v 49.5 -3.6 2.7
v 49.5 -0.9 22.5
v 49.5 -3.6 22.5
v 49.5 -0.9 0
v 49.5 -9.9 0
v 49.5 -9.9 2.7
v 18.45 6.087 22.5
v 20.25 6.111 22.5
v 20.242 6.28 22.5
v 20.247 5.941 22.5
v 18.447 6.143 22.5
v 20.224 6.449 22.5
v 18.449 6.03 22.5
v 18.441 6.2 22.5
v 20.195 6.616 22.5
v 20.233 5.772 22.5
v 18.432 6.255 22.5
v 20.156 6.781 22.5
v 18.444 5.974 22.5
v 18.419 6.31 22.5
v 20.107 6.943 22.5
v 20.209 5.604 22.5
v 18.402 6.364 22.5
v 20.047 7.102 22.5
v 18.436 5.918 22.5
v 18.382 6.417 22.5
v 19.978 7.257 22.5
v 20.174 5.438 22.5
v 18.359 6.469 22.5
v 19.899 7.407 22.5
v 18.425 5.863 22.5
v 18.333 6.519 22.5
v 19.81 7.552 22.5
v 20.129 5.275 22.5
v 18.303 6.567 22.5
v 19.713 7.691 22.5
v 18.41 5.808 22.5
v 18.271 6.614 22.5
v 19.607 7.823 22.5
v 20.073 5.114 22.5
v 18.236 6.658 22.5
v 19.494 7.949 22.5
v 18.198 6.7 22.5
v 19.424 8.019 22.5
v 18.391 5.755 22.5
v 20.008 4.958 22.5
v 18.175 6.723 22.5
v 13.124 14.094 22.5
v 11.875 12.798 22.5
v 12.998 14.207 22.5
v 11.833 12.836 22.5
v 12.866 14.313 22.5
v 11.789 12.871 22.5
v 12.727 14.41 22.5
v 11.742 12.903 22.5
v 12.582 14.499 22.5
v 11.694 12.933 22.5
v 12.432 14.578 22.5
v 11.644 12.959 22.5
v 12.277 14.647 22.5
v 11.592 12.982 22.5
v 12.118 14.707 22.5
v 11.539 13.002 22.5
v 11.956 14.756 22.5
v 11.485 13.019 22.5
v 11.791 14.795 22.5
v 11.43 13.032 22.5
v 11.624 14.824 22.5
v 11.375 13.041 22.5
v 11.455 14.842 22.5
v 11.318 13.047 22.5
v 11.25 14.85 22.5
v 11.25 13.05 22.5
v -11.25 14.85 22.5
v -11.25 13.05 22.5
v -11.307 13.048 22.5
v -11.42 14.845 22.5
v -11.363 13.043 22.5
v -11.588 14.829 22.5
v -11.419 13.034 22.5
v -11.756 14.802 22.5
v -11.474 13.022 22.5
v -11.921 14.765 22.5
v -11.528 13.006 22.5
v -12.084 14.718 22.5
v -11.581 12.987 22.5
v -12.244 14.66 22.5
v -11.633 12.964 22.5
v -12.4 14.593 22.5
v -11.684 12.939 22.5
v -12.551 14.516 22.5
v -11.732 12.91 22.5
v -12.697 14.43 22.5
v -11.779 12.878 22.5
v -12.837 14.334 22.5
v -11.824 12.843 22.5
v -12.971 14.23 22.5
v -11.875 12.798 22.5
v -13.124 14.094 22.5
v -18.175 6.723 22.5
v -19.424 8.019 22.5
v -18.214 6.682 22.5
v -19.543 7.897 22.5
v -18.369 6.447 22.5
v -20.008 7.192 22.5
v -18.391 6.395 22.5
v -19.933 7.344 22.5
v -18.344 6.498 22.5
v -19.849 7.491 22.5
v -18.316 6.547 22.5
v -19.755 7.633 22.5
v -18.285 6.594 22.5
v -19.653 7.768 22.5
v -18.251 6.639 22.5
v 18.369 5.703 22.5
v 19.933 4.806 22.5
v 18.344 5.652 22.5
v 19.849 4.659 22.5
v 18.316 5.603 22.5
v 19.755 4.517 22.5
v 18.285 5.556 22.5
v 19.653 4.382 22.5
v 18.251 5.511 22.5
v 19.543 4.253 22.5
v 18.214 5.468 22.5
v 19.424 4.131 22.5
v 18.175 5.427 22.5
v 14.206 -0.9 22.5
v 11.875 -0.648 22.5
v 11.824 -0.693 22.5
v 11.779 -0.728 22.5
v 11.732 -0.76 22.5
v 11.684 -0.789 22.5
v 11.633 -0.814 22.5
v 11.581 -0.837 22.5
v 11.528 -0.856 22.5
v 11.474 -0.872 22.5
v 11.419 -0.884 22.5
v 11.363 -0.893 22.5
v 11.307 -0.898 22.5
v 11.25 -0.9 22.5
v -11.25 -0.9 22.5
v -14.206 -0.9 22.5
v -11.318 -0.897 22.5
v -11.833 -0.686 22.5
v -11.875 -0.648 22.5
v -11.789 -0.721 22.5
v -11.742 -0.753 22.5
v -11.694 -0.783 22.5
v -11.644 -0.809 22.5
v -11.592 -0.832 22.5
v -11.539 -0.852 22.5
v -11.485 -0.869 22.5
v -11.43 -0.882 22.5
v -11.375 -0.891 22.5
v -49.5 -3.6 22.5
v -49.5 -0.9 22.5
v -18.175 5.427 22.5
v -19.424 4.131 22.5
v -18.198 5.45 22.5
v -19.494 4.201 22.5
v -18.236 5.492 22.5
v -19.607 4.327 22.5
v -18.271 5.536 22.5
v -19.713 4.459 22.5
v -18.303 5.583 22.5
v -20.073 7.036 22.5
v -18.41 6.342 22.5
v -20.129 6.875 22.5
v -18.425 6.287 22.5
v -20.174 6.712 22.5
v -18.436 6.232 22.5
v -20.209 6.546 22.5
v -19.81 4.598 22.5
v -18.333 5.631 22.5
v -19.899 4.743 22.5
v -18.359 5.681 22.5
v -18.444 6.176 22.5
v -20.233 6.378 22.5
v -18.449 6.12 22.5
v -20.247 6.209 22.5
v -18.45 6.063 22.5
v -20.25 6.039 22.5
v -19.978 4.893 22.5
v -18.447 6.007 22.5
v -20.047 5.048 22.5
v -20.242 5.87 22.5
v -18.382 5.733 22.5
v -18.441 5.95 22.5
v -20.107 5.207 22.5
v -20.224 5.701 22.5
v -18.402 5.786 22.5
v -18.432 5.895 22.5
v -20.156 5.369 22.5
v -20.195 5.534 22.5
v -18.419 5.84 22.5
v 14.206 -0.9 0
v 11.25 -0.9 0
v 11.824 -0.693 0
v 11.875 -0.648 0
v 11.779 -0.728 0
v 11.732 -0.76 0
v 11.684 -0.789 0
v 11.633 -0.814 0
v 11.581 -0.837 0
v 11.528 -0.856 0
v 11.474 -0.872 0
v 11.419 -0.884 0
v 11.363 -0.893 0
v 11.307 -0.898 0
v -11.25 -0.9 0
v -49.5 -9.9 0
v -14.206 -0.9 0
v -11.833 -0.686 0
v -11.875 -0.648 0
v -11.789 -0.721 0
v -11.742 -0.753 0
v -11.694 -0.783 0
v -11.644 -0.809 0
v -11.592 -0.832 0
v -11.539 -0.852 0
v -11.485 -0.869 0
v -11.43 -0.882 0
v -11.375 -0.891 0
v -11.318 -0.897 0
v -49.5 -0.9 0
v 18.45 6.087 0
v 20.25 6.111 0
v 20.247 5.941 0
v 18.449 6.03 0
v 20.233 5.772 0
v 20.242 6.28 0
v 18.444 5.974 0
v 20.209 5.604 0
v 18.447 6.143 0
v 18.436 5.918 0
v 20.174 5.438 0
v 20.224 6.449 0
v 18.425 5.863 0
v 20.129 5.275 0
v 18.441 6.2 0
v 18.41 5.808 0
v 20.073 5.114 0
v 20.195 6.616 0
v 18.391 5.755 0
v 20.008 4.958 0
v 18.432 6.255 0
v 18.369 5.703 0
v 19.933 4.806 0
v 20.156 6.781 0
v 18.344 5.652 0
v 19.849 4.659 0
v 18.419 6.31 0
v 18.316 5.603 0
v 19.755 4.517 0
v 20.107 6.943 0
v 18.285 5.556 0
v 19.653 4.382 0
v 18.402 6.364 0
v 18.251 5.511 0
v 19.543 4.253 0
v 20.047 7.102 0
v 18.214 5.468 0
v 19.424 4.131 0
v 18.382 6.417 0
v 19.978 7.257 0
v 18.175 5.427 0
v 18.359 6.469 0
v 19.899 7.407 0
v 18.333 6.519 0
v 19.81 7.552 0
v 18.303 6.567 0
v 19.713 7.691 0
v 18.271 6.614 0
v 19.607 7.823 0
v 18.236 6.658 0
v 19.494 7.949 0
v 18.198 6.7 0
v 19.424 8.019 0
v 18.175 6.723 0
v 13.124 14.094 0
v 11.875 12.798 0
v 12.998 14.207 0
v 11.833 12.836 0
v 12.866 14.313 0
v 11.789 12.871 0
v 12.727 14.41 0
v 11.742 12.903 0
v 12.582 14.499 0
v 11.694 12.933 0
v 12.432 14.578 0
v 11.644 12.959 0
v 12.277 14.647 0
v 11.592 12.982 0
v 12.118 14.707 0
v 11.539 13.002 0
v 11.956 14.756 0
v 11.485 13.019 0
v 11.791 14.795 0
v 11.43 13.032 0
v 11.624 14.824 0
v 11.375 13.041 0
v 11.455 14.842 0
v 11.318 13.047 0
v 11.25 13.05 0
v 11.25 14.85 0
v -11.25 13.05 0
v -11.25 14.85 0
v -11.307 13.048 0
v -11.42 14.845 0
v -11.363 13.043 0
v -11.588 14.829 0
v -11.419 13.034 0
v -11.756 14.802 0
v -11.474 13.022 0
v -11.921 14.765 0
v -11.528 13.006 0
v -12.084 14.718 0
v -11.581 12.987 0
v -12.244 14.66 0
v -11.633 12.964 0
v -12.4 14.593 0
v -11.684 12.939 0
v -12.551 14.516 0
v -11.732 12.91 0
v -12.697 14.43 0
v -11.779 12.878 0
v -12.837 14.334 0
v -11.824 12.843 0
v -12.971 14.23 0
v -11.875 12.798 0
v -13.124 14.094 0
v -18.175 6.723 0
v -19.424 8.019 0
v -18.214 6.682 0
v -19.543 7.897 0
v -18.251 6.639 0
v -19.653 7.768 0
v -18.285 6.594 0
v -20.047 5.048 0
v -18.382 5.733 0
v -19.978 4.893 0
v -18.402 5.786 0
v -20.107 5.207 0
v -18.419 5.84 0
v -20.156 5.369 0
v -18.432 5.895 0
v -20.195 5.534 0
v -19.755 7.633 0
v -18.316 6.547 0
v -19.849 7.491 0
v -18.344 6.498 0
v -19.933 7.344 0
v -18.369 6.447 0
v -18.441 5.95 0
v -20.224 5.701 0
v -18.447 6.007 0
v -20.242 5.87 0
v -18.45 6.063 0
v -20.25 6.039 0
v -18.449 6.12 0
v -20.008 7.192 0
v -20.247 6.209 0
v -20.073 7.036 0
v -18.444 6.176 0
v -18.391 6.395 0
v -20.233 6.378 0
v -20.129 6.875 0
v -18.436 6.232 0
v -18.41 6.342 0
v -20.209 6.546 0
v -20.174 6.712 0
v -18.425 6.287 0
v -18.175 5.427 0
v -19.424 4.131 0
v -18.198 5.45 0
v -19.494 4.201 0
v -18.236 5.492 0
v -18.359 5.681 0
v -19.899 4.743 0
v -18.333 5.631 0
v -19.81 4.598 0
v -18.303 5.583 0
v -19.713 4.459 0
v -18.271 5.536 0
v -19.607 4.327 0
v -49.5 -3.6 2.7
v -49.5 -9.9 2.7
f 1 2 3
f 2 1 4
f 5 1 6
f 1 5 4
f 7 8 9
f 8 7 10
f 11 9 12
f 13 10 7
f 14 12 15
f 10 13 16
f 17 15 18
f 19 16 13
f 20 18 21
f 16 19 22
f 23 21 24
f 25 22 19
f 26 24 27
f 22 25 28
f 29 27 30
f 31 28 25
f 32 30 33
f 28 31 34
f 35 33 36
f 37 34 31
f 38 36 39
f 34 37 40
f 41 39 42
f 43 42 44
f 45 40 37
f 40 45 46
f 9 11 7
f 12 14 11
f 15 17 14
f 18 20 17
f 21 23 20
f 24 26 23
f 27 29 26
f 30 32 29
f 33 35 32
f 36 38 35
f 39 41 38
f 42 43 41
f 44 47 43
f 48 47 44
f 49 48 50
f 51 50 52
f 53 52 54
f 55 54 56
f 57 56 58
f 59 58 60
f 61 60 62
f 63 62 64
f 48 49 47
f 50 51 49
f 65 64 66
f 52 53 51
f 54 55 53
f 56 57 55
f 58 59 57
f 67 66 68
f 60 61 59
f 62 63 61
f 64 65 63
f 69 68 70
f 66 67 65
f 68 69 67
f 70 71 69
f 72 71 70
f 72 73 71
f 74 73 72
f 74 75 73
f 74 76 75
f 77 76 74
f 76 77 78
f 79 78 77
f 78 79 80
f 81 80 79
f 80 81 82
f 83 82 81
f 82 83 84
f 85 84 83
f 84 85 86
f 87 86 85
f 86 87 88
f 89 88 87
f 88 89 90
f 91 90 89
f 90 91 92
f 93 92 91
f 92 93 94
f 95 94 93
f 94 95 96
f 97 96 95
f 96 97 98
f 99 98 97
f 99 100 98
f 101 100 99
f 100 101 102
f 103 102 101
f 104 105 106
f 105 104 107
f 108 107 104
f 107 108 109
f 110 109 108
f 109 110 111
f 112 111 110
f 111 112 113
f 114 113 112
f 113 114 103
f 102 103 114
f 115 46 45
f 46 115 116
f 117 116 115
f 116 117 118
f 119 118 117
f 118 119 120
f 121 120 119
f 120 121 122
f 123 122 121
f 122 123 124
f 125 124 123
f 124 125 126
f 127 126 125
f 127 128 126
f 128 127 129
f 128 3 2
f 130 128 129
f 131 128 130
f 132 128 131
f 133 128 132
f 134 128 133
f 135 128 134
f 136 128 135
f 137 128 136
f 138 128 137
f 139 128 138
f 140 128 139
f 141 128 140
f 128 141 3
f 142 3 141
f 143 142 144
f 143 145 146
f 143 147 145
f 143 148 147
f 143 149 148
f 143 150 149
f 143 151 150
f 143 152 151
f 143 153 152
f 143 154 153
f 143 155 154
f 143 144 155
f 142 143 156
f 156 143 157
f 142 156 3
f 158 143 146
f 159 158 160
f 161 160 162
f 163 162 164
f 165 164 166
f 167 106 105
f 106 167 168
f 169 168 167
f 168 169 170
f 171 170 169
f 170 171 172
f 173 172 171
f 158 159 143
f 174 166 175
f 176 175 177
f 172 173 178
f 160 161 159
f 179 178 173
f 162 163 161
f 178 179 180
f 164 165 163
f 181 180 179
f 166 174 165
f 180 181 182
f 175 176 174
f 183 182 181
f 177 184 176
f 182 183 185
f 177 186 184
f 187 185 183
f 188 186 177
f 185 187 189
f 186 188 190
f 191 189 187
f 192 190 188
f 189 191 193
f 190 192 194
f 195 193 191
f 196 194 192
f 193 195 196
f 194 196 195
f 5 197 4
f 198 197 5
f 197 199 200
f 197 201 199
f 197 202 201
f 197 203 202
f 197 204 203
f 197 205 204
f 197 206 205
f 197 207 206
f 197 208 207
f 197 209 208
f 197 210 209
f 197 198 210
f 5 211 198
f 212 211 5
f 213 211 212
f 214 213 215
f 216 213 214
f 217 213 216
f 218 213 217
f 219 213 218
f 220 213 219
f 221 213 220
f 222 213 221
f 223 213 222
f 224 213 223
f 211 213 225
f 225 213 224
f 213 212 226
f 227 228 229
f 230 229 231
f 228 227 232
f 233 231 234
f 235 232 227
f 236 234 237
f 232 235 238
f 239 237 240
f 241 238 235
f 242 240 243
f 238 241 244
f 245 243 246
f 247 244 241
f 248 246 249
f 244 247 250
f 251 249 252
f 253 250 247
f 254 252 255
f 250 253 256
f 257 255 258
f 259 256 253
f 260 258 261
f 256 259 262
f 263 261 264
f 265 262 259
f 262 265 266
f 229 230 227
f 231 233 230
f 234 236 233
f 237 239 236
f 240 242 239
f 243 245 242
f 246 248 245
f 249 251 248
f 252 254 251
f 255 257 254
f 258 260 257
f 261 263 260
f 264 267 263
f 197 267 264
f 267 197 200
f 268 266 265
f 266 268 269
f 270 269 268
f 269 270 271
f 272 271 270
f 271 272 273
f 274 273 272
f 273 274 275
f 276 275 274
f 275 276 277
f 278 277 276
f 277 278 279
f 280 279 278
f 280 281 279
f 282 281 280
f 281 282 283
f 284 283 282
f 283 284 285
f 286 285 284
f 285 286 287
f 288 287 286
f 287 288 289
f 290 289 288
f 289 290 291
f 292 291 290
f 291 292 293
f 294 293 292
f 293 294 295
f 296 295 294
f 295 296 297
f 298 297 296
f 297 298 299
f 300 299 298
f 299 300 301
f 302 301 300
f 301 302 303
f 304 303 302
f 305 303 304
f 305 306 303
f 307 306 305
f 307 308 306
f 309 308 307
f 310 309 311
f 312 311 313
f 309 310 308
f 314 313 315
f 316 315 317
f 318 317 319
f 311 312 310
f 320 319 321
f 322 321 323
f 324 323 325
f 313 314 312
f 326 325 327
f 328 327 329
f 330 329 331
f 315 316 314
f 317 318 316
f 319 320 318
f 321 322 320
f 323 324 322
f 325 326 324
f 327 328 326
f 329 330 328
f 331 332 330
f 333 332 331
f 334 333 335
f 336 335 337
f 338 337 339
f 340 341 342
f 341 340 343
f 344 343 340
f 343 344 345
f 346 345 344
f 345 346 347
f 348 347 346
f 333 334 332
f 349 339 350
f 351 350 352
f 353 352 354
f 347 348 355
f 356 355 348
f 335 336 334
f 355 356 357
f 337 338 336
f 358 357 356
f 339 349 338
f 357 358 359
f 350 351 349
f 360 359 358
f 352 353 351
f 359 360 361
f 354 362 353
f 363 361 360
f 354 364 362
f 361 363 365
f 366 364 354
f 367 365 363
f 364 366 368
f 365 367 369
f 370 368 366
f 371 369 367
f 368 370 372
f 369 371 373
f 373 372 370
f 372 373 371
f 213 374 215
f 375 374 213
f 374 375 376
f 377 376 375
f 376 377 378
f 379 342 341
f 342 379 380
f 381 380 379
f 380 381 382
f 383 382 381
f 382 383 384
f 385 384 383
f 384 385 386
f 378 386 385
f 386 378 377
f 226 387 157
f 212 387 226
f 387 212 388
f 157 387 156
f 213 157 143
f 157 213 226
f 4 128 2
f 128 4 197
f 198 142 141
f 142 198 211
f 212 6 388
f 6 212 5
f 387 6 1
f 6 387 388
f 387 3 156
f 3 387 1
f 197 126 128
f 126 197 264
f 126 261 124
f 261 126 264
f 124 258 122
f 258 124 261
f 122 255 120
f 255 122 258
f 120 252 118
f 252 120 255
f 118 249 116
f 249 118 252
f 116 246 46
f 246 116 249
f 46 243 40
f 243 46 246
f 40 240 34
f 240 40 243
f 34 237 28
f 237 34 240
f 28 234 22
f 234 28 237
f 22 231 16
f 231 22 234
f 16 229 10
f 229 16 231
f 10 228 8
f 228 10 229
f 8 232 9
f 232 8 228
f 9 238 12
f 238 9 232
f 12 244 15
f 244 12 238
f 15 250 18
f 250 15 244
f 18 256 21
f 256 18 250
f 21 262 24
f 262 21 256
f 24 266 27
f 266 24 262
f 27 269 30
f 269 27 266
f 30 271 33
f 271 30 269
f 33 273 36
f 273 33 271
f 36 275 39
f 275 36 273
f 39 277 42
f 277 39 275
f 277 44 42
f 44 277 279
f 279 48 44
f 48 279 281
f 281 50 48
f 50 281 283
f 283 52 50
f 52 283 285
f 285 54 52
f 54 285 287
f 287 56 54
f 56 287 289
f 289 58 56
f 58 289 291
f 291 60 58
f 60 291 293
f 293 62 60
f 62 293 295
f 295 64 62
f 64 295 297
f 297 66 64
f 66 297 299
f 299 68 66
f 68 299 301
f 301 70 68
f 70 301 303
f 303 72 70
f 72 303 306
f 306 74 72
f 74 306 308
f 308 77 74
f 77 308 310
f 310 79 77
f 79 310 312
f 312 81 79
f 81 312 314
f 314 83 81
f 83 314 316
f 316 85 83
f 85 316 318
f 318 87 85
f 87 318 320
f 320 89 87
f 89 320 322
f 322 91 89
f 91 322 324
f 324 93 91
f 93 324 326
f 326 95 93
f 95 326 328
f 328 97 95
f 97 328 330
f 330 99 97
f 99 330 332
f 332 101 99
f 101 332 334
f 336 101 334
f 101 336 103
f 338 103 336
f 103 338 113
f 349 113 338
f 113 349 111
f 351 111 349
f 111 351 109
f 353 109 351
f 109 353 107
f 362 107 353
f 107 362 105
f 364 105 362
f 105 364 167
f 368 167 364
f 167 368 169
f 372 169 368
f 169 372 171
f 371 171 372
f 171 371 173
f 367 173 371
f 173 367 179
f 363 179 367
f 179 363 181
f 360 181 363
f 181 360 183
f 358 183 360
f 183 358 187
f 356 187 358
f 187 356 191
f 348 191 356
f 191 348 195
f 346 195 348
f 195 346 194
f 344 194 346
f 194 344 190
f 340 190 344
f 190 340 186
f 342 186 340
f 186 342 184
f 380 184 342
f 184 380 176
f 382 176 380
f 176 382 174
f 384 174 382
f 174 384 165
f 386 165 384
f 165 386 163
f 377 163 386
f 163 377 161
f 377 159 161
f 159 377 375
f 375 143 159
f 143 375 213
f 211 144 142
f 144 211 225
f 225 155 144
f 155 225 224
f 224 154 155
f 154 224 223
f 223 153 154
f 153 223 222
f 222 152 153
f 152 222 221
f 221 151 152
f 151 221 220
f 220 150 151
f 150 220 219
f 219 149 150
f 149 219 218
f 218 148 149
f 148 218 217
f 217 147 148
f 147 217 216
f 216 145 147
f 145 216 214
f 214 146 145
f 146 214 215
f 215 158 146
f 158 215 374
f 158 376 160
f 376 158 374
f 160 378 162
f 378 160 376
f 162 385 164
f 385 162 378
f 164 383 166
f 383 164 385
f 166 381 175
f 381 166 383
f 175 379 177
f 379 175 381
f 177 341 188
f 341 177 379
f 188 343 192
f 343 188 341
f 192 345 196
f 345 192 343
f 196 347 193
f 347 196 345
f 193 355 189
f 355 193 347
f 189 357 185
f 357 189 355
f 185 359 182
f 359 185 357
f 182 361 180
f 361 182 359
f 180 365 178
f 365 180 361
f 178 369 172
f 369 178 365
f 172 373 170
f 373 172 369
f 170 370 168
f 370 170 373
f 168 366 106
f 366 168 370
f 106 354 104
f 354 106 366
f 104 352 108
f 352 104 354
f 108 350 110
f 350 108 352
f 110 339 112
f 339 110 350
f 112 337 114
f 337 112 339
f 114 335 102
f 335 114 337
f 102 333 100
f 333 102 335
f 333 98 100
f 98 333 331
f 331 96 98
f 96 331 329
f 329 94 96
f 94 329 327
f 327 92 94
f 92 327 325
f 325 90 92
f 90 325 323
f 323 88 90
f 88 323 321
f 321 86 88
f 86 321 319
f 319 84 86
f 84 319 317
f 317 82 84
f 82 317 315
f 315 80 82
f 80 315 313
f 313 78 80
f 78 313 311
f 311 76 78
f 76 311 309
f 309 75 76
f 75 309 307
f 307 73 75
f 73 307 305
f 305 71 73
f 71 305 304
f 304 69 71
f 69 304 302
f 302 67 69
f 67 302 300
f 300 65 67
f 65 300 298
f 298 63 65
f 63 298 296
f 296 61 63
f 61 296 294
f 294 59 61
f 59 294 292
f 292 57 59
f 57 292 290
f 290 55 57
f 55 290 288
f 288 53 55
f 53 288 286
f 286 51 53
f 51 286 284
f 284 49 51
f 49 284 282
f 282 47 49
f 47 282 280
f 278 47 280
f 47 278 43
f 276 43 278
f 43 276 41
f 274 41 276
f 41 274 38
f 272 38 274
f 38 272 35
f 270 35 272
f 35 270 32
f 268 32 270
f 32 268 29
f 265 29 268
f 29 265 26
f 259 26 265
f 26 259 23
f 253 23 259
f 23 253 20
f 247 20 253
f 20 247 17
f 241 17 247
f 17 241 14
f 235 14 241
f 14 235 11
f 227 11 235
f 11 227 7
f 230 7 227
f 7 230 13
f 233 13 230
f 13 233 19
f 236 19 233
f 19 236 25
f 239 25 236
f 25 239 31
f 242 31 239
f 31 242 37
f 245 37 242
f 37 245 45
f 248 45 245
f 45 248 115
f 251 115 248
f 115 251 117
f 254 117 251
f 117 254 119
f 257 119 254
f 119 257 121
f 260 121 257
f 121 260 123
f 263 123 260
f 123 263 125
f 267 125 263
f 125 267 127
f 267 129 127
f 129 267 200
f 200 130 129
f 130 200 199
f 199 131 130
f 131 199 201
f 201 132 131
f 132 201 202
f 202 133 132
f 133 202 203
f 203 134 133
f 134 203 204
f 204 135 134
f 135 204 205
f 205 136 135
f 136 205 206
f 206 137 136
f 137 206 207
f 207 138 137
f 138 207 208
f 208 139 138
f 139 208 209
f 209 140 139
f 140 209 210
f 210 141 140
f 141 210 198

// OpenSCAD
width=110; // [90:150]

/* [Hidden] */
$fn=100;

//
/*/
    2 ________ 3
     /        \
  1 /          \4
    \          /
    6\________/ 5
*/
charger_dimensions= [
  [ -7,13.5/2],
  [  0,  0],
  [ 25, 0],
  [ 25+7,13.5/2],
  [25, 13.5],
  [ 0,13.5],
];

// adjustments for my charger
scale([0.9, 0.9, 0.9]) {

// charger
  translate([-12.5, 0, 0])
    linear_extrude(height = 25) {
     difference() {
       offset(r = 3) {
         polygon (points=charger_dimensions);
       }
       offset(r = 1) {
         polygon (points=charger_dimensions);
       }
     }
    }

// Phone
  difference() {
    translate([0,-6,12.5]) {
      color ("red") cube([width,10,25], center=true);
    }
    translate([0,-9,15]) {
      color ("blue") cube([width+1,10,24], center=true);
    }
  }
}
